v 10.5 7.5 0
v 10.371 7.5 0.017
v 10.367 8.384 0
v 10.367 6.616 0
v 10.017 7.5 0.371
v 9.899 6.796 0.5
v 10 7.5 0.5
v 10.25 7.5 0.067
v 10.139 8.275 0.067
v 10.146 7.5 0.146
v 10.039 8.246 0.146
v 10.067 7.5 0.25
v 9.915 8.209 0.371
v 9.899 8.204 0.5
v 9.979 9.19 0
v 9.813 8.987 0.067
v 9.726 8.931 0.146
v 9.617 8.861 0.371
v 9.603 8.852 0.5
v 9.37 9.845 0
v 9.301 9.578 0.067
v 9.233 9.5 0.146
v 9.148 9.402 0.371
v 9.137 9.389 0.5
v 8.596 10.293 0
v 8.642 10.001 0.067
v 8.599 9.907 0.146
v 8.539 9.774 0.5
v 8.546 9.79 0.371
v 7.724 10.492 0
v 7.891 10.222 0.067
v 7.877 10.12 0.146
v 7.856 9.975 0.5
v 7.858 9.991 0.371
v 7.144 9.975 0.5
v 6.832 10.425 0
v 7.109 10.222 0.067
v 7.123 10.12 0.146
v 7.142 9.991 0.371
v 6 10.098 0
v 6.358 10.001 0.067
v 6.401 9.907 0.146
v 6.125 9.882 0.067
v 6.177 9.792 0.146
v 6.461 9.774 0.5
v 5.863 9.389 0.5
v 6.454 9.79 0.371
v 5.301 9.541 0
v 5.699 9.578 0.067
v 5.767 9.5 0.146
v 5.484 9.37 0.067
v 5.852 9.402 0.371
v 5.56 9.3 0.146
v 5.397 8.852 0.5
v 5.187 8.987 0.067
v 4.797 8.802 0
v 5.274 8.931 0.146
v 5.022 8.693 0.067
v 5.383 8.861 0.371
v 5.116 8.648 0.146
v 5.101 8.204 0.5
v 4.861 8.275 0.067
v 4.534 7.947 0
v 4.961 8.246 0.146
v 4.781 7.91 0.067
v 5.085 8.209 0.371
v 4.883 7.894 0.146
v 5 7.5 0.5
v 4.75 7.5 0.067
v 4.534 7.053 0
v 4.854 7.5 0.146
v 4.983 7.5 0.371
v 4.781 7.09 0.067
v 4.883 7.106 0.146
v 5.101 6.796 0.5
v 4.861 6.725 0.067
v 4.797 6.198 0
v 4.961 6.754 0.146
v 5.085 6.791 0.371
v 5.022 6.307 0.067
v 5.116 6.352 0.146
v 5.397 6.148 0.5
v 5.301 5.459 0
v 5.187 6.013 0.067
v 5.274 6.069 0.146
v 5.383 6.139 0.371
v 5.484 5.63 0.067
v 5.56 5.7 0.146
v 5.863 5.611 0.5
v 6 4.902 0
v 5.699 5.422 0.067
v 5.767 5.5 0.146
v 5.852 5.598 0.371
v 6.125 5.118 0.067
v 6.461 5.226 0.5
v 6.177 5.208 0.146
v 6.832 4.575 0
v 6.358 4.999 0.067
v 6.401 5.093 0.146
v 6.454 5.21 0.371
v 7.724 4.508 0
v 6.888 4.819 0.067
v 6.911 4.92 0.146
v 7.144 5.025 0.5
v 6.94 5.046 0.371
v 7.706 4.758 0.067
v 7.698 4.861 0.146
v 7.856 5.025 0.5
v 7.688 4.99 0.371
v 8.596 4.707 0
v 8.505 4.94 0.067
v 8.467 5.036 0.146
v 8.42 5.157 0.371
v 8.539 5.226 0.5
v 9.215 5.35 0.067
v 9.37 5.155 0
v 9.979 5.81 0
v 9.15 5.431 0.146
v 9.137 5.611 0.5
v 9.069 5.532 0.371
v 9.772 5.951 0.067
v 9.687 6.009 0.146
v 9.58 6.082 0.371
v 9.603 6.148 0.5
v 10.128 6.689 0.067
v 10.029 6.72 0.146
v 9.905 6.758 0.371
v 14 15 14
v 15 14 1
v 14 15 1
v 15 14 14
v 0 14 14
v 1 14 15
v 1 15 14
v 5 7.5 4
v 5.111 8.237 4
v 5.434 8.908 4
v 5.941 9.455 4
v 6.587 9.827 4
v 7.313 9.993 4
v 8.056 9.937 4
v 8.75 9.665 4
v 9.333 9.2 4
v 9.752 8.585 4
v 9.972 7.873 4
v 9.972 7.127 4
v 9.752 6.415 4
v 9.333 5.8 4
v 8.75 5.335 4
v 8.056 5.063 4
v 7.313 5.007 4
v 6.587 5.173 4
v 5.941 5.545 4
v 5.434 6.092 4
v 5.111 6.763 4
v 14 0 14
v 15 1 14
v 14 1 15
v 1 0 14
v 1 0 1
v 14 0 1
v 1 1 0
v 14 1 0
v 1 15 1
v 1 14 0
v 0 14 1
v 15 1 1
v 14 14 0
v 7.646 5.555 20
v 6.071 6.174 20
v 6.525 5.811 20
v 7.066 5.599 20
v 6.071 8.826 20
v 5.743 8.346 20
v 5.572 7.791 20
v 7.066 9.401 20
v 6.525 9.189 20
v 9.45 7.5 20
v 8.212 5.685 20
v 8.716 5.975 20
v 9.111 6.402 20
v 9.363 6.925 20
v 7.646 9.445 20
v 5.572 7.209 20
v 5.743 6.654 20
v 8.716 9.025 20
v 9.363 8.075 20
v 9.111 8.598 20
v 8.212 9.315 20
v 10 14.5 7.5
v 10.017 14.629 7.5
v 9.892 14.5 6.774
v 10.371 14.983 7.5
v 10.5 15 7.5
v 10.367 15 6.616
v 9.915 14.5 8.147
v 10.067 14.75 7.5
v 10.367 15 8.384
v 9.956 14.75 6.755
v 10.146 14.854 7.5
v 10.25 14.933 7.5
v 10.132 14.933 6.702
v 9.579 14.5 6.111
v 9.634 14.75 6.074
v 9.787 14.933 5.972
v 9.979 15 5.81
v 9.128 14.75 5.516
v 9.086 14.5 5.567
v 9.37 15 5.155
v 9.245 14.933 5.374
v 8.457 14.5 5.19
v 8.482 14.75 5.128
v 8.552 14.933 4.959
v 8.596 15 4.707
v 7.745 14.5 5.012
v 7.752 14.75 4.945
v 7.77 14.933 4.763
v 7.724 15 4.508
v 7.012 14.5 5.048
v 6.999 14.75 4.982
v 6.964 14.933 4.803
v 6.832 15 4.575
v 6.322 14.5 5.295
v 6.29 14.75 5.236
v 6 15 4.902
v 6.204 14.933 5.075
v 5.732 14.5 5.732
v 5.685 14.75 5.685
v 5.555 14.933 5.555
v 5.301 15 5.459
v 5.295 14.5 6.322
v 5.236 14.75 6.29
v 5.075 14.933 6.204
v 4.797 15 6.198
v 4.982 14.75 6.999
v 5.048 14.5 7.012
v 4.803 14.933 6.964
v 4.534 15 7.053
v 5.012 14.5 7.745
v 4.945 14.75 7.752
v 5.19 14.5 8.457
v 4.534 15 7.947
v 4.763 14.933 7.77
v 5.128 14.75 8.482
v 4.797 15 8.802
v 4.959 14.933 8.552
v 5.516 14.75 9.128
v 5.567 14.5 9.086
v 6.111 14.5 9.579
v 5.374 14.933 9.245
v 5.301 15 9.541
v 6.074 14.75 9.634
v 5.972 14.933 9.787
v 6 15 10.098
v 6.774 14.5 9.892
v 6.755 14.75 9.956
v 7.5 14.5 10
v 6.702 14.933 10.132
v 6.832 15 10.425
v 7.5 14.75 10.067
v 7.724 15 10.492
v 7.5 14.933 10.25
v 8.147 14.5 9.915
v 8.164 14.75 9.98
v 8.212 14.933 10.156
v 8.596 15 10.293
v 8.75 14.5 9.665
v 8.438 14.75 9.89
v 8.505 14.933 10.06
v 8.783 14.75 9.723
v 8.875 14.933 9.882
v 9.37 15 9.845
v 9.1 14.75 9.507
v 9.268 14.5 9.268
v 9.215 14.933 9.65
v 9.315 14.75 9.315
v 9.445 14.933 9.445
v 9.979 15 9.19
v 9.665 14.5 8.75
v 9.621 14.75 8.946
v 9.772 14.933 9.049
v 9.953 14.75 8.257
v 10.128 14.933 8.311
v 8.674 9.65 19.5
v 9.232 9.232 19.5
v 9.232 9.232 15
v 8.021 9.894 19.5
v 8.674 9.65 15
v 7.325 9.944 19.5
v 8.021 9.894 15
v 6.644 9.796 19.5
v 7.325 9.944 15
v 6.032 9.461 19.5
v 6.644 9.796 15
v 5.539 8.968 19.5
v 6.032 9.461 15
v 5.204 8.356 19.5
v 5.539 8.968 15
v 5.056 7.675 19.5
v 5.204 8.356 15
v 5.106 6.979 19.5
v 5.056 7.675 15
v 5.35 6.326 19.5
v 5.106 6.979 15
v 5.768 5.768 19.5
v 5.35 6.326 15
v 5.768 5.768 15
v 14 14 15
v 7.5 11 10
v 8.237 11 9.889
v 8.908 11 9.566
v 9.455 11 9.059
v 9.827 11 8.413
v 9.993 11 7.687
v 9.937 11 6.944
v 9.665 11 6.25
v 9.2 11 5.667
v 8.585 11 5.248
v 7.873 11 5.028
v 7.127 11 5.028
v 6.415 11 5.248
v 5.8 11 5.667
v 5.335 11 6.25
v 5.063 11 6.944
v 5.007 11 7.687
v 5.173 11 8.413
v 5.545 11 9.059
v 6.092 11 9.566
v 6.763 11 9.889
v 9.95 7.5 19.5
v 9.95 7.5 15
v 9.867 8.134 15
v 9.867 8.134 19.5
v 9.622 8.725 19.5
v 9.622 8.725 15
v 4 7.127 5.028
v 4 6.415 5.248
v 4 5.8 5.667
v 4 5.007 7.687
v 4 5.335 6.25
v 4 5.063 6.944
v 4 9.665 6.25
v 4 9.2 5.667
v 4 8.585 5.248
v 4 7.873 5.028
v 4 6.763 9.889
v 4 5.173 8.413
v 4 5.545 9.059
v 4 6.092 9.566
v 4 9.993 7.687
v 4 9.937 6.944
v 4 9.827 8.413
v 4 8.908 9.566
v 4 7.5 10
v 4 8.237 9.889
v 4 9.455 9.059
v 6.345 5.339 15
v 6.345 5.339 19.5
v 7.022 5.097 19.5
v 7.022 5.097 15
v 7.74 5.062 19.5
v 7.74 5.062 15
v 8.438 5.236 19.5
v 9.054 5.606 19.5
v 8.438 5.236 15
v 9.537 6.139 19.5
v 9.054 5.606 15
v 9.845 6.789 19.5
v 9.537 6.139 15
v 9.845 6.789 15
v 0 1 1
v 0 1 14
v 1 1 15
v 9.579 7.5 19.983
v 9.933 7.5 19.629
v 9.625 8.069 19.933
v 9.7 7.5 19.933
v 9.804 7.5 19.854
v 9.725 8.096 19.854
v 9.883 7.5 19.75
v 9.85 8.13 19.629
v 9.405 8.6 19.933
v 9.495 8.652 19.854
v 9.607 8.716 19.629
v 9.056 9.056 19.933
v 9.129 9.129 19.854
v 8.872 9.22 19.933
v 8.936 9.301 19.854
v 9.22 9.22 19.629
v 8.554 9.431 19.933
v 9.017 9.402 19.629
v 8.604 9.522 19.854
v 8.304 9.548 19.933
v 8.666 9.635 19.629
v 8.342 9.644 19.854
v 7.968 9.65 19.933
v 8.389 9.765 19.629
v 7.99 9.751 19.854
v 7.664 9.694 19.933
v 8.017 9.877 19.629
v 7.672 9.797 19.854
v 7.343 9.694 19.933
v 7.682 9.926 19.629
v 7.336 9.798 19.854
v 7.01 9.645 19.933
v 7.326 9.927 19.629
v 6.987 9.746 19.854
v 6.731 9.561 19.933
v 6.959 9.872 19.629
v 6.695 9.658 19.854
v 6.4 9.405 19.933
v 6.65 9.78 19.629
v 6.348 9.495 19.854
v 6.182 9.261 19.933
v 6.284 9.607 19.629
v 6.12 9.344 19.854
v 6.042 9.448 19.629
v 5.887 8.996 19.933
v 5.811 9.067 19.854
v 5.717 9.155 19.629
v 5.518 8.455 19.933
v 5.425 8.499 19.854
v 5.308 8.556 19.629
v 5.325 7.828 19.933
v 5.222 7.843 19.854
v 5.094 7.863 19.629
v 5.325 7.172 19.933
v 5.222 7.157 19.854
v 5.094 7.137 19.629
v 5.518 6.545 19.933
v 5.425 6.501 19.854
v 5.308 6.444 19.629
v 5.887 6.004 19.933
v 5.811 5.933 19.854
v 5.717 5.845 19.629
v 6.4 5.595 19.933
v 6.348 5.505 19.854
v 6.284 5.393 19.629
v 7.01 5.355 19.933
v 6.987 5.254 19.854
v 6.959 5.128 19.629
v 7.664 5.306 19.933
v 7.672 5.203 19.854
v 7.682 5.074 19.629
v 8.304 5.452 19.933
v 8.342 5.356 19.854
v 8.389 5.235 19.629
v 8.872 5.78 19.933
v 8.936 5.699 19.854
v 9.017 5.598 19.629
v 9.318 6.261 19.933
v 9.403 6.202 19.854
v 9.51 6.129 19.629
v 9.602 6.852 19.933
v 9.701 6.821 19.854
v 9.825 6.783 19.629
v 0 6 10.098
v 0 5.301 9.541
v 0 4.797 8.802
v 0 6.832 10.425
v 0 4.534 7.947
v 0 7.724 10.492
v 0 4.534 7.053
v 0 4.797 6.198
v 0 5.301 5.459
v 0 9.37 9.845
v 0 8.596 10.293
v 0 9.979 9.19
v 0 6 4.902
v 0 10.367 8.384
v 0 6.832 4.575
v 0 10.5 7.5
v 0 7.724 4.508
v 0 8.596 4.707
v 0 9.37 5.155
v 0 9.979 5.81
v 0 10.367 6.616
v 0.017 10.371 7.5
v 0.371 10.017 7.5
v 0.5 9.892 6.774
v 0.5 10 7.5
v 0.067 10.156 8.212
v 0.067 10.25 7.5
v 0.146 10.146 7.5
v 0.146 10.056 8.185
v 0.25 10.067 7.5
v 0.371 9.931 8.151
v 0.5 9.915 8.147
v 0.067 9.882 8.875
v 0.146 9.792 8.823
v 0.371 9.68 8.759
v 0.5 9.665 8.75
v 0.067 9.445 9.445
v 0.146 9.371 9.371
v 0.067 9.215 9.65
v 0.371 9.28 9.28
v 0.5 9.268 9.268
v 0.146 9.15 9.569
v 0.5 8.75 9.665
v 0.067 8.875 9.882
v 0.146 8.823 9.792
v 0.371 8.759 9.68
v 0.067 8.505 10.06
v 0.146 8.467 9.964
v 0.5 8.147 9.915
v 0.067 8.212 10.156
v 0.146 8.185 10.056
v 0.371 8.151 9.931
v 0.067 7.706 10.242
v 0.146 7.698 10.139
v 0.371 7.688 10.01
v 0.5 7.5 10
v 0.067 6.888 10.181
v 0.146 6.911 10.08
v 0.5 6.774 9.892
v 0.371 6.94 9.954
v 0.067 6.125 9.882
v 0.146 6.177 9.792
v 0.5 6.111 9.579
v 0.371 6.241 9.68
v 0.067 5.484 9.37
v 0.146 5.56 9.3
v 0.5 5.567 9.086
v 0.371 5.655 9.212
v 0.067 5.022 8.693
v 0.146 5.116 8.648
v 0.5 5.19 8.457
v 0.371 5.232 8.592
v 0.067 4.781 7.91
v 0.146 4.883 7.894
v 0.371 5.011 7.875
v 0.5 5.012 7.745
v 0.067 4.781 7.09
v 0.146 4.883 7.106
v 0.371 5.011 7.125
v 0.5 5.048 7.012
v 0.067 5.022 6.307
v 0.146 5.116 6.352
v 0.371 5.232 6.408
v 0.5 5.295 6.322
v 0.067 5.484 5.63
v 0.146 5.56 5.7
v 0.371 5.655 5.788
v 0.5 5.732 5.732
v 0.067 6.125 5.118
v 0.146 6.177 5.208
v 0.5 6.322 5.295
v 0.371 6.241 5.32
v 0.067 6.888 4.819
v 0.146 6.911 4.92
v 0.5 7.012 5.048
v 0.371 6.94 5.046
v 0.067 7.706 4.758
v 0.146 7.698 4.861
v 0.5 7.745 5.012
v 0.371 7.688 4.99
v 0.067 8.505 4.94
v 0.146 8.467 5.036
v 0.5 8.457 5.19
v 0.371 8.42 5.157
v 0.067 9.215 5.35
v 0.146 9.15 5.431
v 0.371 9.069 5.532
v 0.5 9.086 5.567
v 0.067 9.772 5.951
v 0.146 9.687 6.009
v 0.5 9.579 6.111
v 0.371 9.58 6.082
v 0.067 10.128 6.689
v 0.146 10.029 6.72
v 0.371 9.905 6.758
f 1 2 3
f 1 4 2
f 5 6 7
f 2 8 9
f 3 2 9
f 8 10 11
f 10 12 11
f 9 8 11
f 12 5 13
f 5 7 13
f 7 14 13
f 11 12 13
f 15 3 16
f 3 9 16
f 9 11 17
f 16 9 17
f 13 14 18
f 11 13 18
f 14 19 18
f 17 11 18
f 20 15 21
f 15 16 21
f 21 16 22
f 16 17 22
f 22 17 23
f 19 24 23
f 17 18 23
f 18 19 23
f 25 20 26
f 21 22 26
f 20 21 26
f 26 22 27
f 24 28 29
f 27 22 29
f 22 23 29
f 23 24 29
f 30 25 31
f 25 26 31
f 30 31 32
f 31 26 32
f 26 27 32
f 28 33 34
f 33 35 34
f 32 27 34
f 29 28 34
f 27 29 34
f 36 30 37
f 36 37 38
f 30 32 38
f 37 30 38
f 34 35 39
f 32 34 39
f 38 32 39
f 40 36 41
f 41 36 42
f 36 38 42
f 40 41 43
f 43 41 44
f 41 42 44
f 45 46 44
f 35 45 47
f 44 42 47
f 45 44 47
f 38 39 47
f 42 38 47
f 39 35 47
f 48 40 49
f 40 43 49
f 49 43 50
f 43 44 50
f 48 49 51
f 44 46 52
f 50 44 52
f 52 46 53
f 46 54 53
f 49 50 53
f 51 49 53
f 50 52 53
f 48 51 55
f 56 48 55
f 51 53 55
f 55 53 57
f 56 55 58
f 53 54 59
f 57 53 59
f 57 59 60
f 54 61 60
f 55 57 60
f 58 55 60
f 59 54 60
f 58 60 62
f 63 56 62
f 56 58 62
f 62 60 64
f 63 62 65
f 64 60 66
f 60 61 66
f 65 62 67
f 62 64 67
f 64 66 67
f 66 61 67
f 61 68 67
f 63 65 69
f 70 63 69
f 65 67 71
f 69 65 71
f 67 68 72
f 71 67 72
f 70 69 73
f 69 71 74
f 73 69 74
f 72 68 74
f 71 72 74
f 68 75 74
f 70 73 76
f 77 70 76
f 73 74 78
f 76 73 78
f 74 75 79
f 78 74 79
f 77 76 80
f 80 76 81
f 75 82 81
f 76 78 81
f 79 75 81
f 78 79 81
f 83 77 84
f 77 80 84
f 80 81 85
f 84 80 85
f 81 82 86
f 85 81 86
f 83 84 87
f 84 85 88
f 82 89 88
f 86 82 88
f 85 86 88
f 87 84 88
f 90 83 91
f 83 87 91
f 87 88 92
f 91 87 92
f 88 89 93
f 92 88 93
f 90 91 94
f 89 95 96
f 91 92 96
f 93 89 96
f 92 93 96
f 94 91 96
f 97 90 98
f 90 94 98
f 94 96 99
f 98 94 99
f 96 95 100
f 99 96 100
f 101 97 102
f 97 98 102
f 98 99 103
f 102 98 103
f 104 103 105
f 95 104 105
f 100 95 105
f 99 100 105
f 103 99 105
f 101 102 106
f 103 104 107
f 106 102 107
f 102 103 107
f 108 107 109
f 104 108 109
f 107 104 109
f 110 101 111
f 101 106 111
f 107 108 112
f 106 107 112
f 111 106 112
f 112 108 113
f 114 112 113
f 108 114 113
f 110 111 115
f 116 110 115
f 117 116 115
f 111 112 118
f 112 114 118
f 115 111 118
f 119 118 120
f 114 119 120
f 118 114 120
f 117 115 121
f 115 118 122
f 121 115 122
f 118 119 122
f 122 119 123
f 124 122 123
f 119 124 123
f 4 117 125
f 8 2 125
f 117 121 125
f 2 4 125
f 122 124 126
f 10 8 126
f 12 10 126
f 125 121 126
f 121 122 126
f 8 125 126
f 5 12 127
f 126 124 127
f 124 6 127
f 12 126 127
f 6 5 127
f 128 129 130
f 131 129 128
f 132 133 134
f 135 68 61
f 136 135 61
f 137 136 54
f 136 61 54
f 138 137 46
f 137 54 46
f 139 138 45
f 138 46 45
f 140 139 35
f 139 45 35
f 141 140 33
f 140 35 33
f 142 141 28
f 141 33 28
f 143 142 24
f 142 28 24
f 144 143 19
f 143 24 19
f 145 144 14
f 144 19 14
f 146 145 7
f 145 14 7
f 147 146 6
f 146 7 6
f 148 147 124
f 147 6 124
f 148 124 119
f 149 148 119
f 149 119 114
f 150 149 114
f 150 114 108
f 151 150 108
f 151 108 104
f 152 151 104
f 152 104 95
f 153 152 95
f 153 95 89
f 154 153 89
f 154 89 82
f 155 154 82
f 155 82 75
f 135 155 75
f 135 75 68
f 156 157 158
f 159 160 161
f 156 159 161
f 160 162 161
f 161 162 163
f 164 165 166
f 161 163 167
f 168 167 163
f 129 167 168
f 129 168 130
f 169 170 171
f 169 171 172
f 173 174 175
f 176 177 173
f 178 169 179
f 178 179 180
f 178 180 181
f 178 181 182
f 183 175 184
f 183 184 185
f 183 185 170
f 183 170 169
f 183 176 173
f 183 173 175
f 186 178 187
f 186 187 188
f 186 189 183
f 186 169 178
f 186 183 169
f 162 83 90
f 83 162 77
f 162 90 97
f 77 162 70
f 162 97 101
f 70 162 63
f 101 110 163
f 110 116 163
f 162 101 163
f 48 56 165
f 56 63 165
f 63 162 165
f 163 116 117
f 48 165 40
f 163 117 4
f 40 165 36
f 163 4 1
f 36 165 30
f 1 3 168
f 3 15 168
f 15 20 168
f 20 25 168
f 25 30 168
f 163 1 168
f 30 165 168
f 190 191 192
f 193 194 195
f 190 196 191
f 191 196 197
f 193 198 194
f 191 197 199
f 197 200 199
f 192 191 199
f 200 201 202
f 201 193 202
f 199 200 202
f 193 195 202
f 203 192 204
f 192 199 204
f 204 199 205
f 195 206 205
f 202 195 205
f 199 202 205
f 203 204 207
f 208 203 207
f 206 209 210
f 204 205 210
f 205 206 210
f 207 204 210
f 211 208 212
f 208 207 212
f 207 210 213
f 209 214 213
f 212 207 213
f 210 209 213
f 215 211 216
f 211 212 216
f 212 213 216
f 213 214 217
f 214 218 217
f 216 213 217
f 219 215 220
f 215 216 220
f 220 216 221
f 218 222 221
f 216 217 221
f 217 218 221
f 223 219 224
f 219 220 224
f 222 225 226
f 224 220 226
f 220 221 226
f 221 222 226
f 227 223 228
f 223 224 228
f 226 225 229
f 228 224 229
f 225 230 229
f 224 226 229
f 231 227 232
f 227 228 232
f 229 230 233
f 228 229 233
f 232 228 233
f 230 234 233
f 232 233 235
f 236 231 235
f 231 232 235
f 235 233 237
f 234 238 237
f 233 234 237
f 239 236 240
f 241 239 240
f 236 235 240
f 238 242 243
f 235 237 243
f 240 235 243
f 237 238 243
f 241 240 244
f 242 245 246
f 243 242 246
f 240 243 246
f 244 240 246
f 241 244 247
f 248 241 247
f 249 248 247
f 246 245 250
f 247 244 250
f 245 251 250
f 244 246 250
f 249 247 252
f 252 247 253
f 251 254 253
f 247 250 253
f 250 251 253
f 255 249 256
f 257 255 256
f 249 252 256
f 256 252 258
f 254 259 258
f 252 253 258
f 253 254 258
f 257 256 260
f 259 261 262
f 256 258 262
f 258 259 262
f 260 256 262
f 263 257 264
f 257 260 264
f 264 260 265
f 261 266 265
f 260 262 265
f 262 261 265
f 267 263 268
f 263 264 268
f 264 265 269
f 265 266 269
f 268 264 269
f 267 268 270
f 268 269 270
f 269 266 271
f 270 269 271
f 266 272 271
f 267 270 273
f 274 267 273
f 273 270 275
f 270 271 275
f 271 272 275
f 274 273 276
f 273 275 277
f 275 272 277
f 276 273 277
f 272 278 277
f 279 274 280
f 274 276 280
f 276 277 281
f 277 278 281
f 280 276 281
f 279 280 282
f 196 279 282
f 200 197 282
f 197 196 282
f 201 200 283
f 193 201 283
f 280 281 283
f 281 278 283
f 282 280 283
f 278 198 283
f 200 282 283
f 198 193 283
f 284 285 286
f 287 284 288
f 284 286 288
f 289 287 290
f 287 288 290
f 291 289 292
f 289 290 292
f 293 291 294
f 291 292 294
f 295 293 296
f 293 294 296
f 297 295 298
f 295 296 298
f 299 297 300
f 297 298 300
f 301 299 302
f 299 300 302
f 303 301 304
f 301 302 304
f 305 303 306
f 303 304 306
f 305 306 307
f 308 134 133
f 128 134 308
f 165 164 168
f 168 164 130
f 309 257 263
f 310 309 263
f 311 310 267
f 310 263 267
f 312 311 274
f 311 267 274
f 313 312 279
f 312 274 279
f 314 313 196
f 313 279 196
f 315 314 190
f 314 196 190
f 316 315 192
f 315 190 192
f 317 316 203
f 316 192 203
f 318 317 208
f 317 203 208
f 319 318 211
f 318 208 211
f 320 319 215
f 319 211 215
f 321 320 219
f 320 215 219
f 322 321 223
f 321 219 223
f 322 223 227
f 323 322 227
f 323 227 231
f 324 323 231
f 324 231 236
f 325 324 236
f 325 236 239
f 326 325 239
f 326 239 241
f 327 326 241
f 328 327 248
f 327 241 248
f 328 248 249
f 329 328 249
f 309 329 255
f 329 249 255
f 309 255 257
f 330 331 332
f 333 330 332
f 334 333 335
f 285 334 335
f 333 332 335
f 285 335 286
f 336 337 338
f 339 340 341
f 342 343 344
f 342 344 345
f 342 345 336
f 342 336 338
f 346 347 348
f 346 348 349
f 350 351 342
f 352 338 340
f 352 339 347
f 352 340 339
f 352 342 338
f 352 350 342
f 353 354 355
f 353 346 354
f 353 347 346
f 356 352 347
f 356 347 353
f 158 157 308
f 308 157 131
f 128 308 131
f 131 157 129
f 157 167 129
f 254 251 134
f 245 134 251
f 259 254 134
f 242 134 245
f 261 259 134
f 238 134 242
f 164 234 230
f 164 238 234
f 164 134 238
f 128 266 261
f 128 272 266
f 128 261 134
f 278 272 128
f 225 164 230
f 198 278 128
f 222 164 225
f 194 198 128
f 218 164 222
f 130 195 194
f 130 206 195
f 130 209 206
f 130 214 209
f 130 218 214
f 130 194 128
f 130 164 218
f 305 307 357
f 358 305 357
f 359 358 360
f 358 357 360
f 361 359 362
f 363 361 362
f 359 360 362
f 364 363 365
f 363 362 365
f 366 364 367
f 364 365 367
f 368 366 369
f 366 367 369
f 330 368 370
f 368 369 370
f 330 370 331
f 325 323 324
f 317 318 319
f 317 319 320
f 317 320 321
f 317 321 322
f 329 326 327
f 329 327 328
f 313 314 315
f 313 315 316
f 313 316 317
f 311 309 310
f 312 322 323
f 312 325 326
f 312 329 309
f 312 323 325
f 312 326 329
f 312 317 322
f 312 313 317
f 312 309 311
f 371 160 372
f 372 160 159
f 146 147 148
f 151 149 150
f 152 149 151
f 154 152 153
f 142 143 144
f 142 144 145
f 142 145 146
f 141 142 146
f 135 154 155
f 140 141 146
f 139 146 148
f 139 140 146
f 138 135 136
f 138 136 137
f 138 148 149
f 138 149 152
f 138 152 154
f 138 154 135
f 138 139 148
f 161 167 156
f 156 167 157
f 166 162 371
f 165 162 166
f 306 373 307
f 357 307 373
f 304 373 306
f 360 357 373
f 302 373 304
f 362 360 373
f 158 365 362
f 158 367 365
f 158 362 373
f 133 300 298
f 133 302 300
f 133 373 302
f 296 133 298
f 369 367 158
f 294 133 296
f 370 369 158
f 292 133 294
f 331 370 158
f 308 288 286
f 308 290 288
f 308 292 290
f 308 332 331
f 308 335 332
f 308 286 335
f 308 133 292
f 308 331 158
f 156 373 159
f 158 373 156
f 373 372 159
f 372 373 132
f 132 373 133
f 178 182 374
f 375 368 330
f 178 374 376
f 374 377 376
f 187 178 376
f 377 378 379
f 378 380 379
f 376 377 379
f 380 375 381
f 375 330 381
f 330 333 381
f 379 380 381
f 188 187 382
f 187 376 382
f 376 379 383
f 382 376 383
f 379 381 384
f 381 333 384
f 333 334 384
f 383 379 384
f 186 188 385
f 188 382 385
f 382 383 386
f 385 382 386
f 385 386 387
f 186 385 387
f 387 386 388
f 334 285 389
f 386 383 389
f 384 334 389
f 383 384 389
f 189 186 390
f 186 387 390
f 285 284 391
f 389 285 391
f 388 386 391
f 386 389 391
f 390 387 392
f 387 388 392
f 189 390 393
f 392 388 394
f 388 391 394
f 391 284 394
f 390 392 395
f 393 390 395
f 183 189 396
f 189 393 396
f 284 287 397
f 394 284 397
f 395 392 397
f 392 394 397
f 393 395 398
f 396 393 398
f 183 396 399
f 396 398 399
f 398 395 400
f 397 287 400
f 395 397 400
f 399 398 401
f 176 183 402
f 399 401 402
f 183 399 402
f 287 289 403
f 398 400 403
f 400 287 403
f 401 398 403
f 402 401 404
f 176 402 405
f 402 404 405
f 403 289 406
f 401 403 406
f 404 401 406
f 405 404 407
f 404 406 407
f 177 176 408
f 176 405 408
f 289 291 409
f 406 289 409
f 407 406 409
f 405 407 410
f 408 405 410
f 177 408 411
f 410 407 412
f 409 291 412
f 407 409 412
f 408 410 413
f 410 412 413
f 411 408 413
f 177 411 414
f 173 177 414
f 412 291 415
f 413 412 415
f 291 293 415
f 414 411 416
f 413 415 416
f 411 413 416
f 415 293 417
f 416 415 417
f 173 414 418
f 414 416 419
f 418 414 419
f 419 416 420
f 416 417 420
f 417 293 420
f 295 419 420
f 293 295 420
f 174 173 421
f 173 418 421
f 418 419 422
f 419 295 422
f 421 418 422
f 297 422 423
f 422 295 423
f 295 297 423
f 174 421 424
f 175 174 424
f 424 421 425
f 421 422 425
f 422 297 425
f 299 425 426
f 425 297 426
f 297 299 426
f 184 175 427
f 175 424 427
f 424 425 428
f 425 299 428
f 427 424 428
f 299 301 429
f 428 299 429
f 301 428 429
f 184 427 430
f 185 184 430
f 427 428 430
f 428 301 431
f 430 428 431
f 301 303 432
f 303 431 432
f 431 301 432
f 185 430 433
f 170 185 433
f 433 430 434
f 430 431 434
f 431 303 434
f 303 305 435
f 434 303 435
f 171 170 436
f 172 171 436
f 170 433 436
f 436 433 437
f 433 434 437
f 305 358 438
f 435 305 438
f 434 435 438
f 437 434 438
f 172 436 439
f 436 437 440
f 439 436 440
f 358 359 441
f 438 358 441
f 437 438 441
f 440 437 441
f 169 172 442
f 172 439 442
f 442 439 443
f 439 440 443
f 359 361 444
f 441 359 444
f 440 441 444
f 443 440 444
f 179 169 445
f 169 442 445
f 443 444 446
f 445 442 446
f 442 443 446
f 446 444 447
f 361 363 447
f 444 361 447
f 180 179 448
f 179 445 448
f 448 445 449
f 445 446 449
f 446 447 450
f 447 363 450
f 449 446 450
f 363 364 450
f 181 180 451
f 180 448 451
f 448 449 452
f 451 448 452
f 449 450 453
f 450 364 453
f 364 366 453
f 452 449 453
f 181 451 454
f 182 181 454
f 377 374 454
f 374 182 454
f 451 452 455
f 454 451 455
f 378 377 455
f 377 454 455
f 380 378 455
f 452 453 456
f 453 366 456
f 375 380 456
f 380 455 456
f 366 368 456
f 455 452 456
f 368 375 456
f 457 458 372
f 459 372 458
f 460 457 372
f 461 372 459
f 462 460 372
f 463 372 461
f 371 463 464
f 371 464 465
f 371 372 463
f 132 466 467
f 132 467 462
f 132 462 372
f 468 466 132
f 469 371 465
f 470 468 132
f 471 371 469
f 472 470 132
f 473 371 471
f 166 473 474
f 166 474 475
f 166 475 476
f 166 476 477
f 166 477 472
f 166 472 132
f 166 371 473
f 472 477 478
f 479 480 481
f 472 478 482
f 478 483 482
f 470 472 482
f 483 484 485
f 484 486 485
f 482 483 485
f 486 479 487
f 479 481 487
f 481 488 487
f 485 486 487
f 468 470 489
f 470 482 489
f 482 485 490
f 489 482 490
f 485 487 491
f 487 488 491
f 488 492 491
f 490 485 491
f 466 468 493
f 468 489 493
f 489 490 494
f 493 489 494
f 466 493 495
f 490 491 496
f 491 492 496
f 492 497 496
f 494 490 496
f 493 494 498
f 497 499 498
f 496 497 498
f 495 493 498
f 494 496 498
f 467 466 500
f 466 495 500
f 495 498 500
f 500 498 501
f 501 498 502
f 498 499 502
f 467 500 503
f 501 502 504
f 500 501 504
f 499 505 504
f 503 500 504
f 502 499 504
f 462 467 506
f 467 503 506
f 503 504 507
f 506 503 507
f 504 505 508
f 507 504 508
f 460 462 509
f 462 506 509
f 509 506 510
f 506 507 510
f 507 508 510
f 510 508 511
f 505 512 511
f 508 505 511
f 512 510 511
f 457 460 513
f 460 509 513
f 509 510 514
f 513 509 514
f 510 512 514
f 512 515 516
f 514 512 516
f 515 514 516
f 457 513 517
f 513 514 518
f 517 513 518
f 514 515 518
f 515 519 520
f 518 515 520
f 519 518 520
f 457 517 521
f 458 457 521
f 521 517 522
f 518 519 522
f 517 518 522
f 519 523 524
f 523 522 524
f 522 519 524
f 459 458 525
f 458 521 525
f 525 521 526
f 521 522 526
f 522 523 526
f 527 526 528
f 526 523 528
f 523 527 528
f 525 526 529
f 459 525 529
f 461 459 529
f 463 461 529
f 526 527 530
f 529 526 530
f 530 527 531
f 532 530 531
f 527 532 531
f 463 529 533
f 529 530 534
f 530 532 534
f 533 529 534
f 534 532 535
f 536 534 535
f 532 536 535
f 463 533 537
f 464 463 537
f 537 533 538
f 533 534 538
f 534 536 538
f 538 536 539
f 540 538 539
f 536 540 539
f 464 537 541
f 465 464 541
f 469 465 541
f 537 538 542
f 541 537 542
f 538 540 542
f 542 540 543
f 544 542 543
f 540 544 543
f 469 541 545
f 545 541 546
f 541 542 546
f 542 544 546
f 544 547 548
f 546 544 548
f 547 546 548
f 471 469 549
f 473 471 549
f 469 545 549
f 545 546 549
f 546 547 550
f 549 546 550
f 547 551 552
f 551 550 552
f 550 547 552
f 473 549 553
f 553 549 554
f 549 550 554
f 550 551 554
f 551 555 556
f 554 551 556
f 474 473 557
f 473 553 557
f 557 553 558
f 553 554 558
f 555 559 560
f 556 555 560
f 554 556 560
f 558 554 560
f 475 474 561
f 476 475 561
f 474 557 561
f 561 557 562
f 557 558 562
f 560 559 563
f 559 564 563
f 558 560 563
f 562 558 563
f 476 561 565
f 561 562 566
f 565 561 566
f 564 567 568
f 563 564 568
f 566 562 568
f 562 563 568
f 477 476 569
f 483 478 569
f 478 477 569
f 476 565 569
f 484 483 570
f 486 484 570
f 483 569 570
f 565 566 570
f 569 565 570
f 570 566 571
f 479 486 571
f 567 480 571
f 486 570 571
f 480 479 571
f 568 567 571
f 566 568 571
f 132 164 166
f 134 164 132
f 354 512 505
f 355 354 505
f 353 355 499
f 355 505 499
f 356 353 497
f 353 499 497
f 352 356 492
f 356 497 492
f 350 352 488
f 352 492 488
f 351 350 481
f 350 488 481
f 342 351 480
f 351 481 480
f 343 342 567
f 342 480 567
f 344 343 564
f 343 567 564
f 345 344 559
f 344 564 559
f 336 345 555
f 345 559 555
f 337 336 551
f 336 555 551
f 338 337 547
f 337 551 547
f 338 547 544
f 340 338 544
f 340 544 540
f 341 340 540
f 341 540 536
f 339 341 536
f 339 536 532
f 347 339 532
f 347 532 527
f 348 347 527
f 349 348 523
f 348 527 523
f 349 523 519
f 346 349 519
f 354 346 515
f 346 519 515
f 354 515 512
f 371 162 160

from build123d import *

# Parameters (mm, degrees)
SKETCH1_W           = 15
SKETCH1_H           = 15
BOSS_EXTRUDE1_DEPTH = 15
SKETCH2_R           = 2.45
BOSS_EXTRUDE2_DEPTH = 5
SKETCH7_R           = 2.5
CUT_EXTRUDE1_DEPTH  = 4
SKETCH13_R          = 2.5
CUT_EXTRUDE6_DEPTH  = 4
SKETCH16_R          = 2.5
CUT_EXTRUDE7_DEPTH  = 4
CHAMFER1_SIZE       = 1
FILLET1_R           = 0.5


with BuildPart() as part:
    # Sketch1 → Boss-Extrude1 (new body)
    with BuildSketch(Plane.XY):
        with Locations((7.5, 7.5)):
            Rectangle(SKETCH1_W, SKETCH1_H)
    extrude(amount=BOSS_EXTRUDE1_DEPTH)

    # Sketch2 → Boss-Extrude2 (add)
    with BuildSketch(Plane.XY.offset(15)):
        with Locations((7.5, 7.5)):
            Circle(SKETCH2_R)
    extrude(amount=BOSS_EXTRUDE2_DEPTH)

    # Sketch7 → Cut-Extrude1 (cut)
    with BuildSketch(Plane.ZY):
        with Locations((7.5, 7.5)):
            Circle(SKETCH7_R)
    extrude(amount=-CUT_EXTRUDE1_DEPTH, mode=Mode.SUBTRACT)

    # Sketch13 → Cut-Extrude6 (cut)
    with BuildSketch(Plane(origin=(0, 15, 0), x_dir=(1, 0, 0), z_dir=(0, 1, 0))):
        with Locations((7.5, -7.5)):
            Circle(SKETCH13_R)
    extrude(amount=-CUT_EXTRUDE6_DEPTH, mode=Mode.SUBTRACT)

    # Sketch16 → Cut-Extrude7 (cut)
    with BuildSketch(Plane(origin=(0, 0, 0), x_dir=(-1, 0, 0), z_dir=(0, 0, -1))):
        with Locations((-7.5, 7.5)):
            Circle(SKETCH16_R)
    extrude(amount=-CUT_EXTRUDE7_DEPTH, mode=Mode.SUBTRACT)

    # Chamfer1
    chamfer1_edges = [part.edges().sort_by_distance(p)[0] for p in [
        (7.5, 15, 15),
        (15, 15, 7.5),
        (15, 7.5, 15),
        (15, 0, 7.5),
        (7.5, 0, 15),
        (15, 7.5, 0),
        (7.5, 0, 0),
        (0, 7.5, 15),
        (0, 0, 7.5),
        (0, 15, 7.5),
        (7.5, 15, 0),
        (0, 7.5, 0),
    ]]
    chamfer(chamfer1_edges, length=CHAMFER1_SIZE)

    # Fillet1
    fillet1_edges = [part.edges().sort_by_distance(p)[0] for p in [
        (0, 7.5, 5),
        (5.05, 7.5, 20),
        (5, 15, 7.5),
        (10, 7.5, 0),
    ]]
    fillet(fillet1_edges, radius=FILLET1_R)


solid = part.part
